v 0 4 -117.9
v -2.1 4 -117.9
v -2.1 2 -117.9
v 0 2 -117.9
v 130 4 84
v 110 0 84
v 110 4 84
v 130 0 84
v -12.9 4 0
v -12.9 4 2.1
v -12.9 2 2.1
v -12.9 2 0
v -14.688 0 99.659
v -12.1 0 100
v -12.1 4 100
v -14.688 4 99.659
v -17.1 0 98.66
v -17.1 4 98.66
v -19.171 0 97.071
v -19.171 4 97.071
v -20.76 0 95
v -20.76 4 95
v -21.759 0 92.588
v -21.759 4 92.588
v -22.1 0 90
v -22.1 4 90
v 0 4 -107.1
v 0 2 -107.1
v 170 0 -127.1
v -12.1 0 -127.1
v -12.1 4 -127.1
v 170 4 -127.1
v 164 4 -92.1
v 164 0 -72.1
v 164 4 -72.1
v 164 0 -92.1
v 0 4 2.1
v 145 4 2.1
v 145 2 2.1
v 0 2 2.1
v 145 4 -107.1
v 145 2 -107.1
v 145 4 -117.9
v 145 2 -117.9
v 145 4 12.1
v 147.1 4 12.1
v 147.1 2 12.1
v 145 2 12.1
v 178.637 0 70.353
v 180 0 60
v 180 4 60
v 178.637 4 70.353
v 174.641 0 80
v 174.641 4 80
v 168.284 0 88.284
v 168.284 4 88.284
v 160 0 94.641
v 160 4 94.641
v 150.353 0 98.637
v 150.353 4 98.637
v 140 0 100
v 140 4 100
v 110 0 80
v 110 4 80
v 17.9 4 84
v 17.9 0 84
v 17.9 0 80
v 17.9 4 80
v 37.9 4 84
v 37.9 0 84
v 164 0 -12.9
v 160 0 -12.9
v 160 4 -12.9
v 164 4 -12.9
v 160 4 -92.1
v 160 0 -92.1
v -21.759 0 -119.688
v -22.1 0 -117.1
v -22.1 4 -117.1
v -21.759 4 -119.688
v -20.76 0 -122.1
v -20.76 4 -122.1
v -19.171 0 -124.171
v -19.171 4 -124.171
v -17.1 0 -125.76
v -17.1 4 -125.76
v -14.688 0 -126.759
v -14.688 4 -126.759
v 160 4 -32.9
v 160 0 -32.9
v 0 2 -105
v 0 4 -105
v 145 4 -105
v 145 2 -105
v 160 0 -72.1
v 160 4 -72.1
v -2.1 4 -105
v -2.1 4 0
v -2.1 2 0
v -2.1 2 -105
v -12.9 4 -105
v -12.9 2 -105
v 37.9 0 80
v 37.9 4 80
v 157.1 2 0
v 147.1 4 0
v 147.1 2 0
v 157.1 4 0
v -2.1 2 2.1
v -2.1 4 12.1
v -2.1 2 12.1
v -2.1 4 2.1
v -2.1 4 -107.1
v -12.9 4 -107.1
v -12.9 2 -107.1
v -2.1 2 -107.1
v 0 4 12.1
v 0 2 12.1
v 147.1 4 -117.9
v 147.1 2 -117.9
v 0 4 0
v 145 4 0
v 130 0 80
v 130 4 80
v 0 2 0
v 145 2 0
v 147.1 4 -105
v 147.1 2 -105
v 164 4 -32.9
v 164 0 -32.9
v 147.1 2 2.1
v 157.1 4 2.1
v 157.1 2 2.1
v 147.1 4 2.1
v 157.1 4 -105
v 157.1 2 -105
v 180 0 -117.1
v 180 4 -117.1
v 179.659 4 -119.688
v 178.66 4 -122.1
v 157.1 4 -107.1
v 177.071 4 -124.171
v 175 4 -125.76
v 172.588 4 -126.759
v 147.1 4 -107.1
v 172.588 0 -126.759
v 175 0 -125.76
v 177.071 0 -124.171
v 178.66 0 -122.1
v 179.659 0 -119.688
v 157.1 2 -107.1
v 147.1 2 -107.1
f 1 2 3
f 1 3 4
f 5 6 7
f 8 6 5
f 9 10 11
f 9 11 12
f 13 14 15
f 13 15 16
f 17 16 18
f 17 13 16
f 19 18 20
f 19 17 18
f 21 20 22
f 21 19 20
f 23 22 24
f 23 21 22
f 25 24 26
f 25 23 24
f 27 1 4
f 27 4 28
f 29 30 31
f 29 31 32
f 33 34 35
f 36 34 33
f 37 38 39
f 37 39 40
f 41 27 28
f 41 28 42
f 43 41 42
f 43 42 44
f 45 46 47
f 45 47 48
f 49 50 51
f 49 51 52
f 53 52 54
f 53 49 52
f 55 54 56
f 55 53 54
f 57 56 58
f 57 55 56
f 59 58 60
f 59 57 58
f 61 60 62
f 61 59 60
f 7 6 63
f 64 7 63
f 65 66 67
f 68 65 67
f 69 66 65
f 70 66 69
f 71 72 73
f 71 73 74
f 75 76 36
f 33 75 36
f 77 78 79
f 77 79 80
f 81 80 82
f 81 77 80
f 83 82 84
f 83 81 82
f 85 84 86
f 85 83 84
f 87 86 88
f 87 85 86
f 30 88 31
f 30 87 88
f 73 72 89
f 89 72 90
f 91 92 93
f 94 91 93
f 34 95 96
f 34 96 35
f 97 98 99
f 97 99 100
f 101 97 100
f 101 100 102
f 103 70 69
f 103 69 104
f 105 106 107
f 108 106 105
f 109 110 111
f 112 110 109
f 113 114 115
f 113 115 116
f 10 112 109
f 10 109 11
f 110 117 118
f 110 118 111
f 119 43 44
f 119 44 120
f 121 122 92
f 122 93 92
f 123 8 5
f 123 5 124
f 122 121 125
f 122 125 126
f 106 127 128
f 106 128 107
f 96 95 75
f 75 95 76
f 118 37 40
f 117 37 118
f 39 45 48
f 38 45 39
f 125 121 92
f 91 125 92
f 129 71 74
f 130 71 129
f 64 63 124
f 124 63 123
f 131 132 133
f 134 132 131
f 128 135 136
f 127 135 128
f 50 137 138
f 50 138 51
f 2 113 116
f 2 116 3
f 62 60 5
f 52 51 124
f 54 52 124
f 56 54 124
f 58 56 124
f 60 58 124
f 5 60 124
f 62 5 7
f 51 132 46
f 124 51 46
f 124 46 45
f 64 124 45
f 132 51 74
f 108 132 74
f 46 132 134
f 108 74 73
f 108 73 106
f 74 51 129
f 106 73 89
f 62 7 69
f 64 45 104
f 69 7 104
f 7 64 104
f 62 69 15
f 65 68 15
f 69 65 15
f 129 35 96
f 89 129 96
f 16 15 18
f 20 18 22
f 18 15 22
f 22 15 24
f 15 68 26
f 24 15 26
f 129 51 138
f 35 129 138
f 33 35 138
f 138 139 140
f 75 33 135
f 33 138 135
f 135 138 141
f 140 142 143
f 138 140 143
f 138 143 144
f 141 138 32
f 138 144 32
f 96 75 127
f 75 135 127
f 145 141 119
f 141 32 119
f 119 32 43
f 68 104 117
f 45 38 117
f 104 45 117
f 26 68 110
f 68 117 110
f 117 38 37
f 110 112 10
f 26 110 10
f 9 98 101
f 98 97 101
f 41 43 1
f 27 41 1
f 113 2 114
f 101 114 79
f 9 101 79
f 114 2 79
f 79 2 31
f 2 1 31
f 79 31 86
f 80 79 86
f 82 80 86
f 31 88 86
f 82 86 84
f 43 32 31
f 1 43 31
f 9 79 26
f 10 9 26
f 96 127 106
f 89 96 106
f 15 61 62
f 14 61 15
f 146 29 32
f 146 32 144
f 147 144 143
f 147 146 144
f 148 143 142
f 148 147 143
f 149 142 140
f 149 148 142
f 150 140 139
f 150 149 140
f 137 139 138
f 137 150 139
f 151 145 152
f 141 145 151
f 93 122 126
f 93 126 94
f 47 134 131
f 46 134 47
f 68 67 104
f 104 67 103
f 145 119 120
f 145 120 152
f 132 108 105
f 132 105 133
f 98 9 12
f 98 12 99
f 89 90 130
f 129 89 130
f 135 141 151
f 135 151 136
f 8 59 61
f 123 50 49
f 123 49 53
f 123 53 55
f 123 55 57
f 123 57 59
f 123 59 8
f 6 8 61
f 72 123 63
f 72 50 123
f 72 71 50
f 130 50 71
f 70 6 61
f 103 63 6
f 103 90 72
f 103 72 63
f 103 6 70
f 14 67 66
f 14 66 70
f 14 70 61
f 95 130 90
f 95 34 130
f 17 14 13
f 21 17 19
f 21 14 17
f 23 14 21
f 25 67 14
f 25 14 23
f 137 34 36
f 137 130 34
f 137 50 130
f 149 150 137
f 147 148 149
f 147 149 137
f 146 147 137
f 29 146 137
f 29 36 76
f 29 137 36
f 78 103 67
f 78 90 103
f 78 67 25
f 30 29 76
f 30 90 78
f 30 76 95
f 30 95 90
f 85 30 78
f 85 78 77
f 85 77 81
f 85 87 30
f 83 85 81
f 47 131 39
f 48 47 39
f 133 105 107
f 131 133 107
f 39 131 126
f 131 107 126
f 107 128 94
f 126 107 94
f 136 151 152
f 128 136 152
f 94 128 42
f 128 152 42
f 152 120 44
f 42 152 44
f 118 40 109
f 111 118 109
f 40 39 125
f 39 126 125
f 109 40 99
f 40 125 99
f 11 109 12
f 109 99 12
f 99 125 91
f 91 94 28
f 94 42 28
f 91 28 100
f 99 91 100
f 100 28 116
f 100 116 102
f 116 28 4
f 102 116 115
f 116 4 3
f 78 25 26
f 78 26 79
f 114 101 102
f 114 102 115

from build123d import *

# Parameters (mm, degrees)
SKETCH1_W           = 20
SKETCH1_H           = 4
SKETCH1_W_2         = 4
SKETCH1_H_2         = 20
BOSS_EXTRUDE1_DEPTH = 4
SKETCH2_W           = 145
SKETCH2_H           = 105
CUT_EXTRUDE1_DEPTH  = 2


with BuildPart() as part:
    # Sketch1 → Boss-Extrude1 (new body)
    with BuildSketch(Plane(origin=(0, 0, 0), x_dir=(1, 0, 0), z_dir=(0, 1, 0))):
        with BuildLine():
            Line((-12.1, 127.1), (170, 127.1))
            ThreePointArc((170, 127.1), (177.071067812, 124.171067812), (180, 117.1))
            Line((180, 117.1), (180, -60))
            ThreePointArc((180, -60), (168.284271247, -88.284271247), (140, -100))
            Line((140, -100), (-12.1, -100))
            ThreePointArc((-12.1, -100), (-19.171067812, -97.071067812), (-22.1, -90))
            Line((-22.1, -90), (-22.1, 117.1))
            ThreePointArc((-22.1, 117.1), (-19.171067812, 124.171067812), (-12.1, 127.1))
        make_face()
        with Locations((27.9, -82)):
            Rectangle(SKETCH1_W, SKETCH1_H, mode=Mode.SUBTRACT)
        with Locations((120, -82)):
            Rectangle(SKETCH1_W, SKETCH1_H, mode=Mode.SUBTRACT)
        with Locations((162, 82.1)):
            Rectangle(SKETCH1_W_2, SKETCH1_H_2, mode=Mode.SUBTRACT)
        with Locations((162, 22.9)):
            Rectangle(SKETCH1_W_2, SKETCH1_H_2, mode=Mode.SUBTRACT)
    extrude(amount=BOSS_EXTRUDE1_DEPTH)

    # Sketch2 → Cut-Extrude1 (cut)
    with BuildSketch(Plane(origin=(0, 4, 0), x_dir=(1, 0, 0), z_dir=(0, 1, 0))):
        Polygon((-12.9, 0), (-2.1, 0), (-2.1, 105), (-12.9, 105), (-12.9, 107.1), (-2.1, 107.1), (-2.1, 117.9), (0, 117.9), (0, 107.1), (145, 107.1), (145, 117.9), (147.1, 117.9), (147.1, 107.1), (157.1, 107.1), (157.1, 105), (147.1, 105), (147.1, 0), (157.1, 0), (157.1, -2.1), (147.1, -2.1), (147.1, -12.1), (145, -12.1), (145, -2.1), (0, -2.1), (0, -12.1), (-2.1, -12.1), (-2.1, -2.1), (-12.9, -2.1), align=None)
        with Locations((72.5, 52.5)):
            Rectangle(SKETCH2_W, SKETCH2_H, mode=Mode.SUBTRACT)
    extrude(amount=-CUT_EXTRUDE1_DEPTH, mode=Mode.SUBTRACT)


solid = part.part
